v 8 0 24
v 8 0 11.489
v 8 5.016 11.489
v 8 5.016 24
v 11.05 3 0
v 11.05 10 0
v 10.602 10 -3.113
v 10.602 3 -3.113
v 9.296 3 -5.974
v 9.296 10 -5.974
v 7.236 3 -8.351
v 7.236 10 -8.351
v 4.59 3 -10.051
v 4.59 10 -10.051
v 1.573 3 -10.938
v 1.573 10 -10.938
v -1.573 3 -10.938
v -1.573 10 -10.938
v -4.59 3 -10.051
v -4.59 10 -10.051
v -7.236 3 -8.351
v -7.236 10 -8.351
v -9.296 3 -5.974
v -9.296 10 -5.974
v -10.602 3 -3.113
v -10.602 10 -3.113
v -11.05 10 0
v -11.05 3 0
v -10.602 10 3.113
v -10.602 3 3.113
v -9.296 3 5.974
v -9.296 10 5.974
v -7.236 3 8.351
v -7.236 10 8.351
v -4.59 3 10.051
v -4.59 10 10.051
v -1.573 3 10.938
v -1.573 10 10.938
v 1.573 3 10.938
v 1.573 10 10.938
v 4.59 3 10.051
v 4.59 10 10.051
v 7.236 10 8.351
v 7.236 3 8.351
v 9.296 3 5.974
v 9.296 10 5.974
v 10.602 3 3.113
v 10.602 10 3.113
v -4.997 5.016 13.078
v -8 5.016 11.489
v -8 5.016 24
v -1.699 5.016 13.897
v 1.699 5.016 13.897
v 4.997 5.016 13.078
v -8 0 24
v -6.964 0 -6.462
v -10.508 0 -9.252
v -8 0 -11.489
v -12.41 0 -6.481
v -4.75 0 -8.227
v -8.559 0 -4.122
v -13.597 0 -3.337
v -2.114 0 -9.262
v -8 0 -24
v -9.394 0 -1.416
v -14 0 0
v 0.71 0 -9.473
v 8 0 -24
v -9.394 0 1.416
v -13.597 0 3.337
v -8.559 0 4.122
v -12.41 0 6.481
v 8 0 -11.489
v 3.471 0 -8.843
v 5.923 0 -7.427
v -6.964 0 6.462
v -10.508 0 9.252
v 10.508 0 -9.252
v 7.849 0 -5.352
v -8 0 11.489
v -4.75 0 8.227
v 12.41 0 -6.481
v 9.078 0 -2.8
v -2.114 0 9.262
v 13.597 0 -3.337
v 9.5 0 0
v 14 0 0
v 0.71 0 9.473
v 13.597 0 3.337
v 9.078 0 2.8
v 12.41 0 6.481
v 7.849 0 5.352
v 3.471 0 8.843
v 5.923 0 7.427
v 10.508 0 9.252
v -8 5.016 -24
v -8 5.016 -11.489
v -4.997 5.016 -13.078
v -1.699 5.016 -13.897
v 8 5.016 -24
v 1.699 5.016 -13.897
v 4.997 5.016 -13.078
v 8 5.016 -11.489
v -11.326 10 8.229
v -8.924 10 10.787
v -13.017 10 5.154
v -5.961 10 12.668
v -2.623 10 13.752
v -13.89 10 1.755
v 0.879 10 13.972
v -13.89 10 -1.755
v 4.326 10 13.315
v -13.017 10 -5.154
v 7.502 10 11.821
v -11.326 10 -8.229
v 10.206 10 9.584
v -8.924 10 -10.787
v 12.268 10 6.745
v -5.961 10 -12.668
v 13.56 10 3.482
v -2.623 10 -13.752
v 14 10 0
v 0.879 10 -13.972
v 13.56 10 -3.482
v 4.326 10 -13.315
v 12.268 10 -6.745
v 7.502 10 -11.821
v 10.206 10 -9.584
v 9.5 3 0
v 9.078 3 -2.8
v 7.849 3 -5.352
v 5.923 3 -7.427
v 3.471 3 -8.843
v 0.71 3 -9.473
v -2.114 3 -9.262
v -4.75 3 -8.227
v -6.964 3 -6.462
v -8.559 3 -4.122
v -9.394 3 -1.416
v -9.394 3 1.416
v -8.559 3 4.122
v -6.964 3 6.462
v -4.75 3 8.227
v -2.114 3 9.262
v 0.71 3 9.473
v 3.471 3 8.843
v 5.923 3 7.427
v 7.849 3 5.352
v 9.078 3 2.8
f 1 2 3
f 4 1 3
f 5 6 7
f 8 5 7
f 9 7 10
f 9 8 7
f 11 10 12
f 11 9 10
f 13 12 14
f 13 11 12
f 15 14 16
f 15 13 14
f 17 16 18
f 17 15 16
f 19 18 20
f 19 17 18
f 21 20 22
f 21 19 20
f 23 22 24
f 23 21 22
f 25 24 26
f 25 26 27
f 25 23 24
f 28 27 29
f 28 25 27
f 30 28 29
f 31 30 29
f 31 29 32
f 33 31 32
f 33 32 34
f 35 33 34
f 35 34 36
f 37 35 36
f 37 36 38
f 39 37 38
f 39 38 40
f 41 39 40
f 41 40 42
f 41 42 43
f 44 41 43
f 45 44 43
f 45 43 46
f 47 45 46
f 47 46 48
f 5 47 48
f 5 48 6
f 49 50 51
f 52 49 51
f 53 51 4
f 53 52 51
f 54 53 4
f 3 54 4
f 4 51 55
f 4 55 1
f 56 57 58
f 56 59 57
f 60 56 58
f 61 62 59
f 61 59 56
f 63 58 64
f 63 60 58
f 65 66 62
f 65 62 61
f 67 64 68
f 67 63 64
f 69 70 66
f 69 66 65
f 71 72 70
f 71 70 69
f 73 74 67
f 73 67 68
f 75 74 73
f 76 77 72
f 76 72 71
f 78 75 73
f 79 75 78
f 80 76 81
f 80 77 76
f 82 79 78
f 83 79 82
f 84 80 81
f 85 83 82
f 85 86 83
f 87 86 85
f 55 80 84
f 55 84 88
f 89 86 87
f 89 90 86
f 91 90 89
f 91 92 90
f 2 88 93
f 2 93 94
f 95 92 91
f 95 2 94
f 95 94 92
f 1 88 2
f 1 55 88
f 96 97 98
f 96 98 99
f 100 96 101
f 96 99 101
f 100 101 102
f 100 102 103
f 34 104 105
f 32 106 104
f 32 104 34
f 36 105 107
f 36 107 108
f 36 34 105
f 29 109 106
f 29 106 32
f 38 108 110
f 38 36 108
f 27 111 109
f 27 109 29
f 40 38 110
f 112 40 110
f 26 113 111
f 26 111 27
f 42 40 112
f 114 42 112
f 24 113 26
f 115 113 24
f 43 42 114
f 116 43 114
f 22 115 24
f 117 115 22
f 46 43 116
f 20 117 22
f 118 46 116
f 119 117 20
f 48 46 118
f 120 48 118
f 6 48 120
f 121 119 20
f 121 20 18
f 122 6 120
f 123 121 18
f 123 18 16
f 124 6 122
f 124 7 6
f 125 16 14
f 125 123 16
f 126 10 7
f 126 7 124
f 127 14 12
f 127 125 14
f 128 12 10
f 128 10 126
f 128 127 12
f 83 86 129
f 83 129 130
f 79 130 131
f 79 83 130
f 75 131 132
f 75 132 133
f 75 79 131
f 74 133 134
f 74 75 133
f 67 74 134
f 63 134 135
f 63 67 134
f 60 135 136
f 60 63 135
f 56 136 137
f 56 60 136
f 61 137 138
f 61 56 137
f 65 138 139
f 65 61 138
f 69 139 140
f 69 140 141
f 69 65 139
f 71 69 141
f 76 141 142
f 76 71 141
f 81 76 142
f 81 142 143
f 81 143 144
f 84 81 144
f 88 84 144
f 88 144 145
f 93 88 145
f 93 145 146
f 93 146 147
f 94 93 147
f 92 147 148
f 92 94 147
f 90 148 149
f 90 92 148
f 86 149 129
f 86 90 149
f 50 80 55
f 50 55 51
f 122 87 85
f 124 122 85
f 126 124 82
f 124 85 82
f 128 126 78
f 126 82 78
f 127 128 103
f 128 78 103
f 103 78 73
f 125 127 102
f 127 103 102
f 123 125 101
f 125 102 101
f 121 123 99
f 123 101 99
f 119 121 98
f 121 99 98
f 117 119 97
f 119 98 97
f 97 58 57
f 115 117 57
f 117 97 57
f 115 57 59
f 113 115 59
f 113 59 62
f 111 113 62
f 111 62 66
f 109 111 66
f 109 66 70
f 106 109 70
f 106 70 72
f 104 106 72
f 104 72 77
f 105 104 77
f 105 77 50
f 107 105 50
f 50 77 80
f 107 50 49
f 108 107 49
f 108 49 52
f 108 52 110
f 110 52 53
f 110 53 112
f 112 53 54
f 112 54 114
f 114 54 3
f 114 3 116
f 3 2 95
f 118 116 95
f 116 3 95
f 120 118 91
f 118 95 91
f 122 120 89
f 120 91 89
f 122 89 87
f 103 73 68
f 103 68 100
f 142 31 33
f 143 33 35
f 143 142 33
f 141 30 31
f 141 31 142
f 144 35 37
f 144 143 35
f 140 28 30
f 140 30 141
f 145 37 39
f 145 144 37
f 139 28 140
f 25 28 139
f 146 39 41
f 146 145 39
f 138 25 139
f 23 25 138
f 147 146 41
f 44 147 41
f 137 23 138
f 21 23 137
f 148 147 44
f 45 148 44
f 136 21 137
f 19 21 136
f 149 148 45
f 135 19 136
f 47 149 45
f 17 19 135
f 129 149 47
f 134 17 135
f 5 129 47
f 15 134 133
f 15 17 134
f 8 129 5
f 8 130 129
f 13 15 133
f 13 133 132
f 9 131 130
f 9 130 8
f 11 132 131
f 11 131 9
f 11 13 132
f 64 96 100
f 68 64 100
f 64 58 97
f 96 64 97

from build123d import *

# Parameters (mm, degrees)
SKETCH1_R           = 14
SKETCH1_R_2         = 11.05
BOSS_EXTRUDE1_DEPTH = 10
SKETCH1_3_R         = 11.05
SKETCH1_3_R_2       = 9.5
BOSS_EXTRUDE2_DEPTH = 3
BOSS_EXTRUDE3_START = -2.510875
SKETCH4_W           = 16
SKETCH4_H           = 5.016393312
BOSS_EXTRUDE3_DEPTH = 12.510875


with BuildPart() as part:
    # Sketch1 → Boss-Extrude1 (new body)
    with BuildSketch(Plane(origin=(0, 0, 0), x_dir=(1, 0, 0), z_dir=(0, 1, 0))):
        Circle(SKETCH1_R)
        Circle(SKETCH1_R_2, mode=Mode.SUBTRACT)
    extrude(amount=BOSS_EXTRUDE1_DEPTH)

    # Sketch1<3> → Boss-Extrude2 (add)
    with BuildSketch(Plane(origin=(0, 0, 0), x_dir=(1, 0, 0), z_dir=(0, 1, 0))):
        Circle(SKETCH1_3_R)
        Circle(SKETCH1_3_R_2, mode=Mode.SUBTRACT)
    extrude(amount=BOSS_EXTRUDE2_DEPTH)

    # Sketch4 → Boss-Extrude3 (add)
    with BuildSketch(Plane.XY.offset(14).offset(BOSS_EXTRUDE3_START)):
        with Locations((0, 2.508196656)):
            Rectangle(SKETCH4_W, SKETCH4_H)
    boss_extrude3 = extrude(amount=BOSS_EXTRUDE3_DEPTH)

    # Mirror1: Boss-Extrude3 across plane
    add(boss_extrude3.mirror(Plane.XY))


solid = part.part
